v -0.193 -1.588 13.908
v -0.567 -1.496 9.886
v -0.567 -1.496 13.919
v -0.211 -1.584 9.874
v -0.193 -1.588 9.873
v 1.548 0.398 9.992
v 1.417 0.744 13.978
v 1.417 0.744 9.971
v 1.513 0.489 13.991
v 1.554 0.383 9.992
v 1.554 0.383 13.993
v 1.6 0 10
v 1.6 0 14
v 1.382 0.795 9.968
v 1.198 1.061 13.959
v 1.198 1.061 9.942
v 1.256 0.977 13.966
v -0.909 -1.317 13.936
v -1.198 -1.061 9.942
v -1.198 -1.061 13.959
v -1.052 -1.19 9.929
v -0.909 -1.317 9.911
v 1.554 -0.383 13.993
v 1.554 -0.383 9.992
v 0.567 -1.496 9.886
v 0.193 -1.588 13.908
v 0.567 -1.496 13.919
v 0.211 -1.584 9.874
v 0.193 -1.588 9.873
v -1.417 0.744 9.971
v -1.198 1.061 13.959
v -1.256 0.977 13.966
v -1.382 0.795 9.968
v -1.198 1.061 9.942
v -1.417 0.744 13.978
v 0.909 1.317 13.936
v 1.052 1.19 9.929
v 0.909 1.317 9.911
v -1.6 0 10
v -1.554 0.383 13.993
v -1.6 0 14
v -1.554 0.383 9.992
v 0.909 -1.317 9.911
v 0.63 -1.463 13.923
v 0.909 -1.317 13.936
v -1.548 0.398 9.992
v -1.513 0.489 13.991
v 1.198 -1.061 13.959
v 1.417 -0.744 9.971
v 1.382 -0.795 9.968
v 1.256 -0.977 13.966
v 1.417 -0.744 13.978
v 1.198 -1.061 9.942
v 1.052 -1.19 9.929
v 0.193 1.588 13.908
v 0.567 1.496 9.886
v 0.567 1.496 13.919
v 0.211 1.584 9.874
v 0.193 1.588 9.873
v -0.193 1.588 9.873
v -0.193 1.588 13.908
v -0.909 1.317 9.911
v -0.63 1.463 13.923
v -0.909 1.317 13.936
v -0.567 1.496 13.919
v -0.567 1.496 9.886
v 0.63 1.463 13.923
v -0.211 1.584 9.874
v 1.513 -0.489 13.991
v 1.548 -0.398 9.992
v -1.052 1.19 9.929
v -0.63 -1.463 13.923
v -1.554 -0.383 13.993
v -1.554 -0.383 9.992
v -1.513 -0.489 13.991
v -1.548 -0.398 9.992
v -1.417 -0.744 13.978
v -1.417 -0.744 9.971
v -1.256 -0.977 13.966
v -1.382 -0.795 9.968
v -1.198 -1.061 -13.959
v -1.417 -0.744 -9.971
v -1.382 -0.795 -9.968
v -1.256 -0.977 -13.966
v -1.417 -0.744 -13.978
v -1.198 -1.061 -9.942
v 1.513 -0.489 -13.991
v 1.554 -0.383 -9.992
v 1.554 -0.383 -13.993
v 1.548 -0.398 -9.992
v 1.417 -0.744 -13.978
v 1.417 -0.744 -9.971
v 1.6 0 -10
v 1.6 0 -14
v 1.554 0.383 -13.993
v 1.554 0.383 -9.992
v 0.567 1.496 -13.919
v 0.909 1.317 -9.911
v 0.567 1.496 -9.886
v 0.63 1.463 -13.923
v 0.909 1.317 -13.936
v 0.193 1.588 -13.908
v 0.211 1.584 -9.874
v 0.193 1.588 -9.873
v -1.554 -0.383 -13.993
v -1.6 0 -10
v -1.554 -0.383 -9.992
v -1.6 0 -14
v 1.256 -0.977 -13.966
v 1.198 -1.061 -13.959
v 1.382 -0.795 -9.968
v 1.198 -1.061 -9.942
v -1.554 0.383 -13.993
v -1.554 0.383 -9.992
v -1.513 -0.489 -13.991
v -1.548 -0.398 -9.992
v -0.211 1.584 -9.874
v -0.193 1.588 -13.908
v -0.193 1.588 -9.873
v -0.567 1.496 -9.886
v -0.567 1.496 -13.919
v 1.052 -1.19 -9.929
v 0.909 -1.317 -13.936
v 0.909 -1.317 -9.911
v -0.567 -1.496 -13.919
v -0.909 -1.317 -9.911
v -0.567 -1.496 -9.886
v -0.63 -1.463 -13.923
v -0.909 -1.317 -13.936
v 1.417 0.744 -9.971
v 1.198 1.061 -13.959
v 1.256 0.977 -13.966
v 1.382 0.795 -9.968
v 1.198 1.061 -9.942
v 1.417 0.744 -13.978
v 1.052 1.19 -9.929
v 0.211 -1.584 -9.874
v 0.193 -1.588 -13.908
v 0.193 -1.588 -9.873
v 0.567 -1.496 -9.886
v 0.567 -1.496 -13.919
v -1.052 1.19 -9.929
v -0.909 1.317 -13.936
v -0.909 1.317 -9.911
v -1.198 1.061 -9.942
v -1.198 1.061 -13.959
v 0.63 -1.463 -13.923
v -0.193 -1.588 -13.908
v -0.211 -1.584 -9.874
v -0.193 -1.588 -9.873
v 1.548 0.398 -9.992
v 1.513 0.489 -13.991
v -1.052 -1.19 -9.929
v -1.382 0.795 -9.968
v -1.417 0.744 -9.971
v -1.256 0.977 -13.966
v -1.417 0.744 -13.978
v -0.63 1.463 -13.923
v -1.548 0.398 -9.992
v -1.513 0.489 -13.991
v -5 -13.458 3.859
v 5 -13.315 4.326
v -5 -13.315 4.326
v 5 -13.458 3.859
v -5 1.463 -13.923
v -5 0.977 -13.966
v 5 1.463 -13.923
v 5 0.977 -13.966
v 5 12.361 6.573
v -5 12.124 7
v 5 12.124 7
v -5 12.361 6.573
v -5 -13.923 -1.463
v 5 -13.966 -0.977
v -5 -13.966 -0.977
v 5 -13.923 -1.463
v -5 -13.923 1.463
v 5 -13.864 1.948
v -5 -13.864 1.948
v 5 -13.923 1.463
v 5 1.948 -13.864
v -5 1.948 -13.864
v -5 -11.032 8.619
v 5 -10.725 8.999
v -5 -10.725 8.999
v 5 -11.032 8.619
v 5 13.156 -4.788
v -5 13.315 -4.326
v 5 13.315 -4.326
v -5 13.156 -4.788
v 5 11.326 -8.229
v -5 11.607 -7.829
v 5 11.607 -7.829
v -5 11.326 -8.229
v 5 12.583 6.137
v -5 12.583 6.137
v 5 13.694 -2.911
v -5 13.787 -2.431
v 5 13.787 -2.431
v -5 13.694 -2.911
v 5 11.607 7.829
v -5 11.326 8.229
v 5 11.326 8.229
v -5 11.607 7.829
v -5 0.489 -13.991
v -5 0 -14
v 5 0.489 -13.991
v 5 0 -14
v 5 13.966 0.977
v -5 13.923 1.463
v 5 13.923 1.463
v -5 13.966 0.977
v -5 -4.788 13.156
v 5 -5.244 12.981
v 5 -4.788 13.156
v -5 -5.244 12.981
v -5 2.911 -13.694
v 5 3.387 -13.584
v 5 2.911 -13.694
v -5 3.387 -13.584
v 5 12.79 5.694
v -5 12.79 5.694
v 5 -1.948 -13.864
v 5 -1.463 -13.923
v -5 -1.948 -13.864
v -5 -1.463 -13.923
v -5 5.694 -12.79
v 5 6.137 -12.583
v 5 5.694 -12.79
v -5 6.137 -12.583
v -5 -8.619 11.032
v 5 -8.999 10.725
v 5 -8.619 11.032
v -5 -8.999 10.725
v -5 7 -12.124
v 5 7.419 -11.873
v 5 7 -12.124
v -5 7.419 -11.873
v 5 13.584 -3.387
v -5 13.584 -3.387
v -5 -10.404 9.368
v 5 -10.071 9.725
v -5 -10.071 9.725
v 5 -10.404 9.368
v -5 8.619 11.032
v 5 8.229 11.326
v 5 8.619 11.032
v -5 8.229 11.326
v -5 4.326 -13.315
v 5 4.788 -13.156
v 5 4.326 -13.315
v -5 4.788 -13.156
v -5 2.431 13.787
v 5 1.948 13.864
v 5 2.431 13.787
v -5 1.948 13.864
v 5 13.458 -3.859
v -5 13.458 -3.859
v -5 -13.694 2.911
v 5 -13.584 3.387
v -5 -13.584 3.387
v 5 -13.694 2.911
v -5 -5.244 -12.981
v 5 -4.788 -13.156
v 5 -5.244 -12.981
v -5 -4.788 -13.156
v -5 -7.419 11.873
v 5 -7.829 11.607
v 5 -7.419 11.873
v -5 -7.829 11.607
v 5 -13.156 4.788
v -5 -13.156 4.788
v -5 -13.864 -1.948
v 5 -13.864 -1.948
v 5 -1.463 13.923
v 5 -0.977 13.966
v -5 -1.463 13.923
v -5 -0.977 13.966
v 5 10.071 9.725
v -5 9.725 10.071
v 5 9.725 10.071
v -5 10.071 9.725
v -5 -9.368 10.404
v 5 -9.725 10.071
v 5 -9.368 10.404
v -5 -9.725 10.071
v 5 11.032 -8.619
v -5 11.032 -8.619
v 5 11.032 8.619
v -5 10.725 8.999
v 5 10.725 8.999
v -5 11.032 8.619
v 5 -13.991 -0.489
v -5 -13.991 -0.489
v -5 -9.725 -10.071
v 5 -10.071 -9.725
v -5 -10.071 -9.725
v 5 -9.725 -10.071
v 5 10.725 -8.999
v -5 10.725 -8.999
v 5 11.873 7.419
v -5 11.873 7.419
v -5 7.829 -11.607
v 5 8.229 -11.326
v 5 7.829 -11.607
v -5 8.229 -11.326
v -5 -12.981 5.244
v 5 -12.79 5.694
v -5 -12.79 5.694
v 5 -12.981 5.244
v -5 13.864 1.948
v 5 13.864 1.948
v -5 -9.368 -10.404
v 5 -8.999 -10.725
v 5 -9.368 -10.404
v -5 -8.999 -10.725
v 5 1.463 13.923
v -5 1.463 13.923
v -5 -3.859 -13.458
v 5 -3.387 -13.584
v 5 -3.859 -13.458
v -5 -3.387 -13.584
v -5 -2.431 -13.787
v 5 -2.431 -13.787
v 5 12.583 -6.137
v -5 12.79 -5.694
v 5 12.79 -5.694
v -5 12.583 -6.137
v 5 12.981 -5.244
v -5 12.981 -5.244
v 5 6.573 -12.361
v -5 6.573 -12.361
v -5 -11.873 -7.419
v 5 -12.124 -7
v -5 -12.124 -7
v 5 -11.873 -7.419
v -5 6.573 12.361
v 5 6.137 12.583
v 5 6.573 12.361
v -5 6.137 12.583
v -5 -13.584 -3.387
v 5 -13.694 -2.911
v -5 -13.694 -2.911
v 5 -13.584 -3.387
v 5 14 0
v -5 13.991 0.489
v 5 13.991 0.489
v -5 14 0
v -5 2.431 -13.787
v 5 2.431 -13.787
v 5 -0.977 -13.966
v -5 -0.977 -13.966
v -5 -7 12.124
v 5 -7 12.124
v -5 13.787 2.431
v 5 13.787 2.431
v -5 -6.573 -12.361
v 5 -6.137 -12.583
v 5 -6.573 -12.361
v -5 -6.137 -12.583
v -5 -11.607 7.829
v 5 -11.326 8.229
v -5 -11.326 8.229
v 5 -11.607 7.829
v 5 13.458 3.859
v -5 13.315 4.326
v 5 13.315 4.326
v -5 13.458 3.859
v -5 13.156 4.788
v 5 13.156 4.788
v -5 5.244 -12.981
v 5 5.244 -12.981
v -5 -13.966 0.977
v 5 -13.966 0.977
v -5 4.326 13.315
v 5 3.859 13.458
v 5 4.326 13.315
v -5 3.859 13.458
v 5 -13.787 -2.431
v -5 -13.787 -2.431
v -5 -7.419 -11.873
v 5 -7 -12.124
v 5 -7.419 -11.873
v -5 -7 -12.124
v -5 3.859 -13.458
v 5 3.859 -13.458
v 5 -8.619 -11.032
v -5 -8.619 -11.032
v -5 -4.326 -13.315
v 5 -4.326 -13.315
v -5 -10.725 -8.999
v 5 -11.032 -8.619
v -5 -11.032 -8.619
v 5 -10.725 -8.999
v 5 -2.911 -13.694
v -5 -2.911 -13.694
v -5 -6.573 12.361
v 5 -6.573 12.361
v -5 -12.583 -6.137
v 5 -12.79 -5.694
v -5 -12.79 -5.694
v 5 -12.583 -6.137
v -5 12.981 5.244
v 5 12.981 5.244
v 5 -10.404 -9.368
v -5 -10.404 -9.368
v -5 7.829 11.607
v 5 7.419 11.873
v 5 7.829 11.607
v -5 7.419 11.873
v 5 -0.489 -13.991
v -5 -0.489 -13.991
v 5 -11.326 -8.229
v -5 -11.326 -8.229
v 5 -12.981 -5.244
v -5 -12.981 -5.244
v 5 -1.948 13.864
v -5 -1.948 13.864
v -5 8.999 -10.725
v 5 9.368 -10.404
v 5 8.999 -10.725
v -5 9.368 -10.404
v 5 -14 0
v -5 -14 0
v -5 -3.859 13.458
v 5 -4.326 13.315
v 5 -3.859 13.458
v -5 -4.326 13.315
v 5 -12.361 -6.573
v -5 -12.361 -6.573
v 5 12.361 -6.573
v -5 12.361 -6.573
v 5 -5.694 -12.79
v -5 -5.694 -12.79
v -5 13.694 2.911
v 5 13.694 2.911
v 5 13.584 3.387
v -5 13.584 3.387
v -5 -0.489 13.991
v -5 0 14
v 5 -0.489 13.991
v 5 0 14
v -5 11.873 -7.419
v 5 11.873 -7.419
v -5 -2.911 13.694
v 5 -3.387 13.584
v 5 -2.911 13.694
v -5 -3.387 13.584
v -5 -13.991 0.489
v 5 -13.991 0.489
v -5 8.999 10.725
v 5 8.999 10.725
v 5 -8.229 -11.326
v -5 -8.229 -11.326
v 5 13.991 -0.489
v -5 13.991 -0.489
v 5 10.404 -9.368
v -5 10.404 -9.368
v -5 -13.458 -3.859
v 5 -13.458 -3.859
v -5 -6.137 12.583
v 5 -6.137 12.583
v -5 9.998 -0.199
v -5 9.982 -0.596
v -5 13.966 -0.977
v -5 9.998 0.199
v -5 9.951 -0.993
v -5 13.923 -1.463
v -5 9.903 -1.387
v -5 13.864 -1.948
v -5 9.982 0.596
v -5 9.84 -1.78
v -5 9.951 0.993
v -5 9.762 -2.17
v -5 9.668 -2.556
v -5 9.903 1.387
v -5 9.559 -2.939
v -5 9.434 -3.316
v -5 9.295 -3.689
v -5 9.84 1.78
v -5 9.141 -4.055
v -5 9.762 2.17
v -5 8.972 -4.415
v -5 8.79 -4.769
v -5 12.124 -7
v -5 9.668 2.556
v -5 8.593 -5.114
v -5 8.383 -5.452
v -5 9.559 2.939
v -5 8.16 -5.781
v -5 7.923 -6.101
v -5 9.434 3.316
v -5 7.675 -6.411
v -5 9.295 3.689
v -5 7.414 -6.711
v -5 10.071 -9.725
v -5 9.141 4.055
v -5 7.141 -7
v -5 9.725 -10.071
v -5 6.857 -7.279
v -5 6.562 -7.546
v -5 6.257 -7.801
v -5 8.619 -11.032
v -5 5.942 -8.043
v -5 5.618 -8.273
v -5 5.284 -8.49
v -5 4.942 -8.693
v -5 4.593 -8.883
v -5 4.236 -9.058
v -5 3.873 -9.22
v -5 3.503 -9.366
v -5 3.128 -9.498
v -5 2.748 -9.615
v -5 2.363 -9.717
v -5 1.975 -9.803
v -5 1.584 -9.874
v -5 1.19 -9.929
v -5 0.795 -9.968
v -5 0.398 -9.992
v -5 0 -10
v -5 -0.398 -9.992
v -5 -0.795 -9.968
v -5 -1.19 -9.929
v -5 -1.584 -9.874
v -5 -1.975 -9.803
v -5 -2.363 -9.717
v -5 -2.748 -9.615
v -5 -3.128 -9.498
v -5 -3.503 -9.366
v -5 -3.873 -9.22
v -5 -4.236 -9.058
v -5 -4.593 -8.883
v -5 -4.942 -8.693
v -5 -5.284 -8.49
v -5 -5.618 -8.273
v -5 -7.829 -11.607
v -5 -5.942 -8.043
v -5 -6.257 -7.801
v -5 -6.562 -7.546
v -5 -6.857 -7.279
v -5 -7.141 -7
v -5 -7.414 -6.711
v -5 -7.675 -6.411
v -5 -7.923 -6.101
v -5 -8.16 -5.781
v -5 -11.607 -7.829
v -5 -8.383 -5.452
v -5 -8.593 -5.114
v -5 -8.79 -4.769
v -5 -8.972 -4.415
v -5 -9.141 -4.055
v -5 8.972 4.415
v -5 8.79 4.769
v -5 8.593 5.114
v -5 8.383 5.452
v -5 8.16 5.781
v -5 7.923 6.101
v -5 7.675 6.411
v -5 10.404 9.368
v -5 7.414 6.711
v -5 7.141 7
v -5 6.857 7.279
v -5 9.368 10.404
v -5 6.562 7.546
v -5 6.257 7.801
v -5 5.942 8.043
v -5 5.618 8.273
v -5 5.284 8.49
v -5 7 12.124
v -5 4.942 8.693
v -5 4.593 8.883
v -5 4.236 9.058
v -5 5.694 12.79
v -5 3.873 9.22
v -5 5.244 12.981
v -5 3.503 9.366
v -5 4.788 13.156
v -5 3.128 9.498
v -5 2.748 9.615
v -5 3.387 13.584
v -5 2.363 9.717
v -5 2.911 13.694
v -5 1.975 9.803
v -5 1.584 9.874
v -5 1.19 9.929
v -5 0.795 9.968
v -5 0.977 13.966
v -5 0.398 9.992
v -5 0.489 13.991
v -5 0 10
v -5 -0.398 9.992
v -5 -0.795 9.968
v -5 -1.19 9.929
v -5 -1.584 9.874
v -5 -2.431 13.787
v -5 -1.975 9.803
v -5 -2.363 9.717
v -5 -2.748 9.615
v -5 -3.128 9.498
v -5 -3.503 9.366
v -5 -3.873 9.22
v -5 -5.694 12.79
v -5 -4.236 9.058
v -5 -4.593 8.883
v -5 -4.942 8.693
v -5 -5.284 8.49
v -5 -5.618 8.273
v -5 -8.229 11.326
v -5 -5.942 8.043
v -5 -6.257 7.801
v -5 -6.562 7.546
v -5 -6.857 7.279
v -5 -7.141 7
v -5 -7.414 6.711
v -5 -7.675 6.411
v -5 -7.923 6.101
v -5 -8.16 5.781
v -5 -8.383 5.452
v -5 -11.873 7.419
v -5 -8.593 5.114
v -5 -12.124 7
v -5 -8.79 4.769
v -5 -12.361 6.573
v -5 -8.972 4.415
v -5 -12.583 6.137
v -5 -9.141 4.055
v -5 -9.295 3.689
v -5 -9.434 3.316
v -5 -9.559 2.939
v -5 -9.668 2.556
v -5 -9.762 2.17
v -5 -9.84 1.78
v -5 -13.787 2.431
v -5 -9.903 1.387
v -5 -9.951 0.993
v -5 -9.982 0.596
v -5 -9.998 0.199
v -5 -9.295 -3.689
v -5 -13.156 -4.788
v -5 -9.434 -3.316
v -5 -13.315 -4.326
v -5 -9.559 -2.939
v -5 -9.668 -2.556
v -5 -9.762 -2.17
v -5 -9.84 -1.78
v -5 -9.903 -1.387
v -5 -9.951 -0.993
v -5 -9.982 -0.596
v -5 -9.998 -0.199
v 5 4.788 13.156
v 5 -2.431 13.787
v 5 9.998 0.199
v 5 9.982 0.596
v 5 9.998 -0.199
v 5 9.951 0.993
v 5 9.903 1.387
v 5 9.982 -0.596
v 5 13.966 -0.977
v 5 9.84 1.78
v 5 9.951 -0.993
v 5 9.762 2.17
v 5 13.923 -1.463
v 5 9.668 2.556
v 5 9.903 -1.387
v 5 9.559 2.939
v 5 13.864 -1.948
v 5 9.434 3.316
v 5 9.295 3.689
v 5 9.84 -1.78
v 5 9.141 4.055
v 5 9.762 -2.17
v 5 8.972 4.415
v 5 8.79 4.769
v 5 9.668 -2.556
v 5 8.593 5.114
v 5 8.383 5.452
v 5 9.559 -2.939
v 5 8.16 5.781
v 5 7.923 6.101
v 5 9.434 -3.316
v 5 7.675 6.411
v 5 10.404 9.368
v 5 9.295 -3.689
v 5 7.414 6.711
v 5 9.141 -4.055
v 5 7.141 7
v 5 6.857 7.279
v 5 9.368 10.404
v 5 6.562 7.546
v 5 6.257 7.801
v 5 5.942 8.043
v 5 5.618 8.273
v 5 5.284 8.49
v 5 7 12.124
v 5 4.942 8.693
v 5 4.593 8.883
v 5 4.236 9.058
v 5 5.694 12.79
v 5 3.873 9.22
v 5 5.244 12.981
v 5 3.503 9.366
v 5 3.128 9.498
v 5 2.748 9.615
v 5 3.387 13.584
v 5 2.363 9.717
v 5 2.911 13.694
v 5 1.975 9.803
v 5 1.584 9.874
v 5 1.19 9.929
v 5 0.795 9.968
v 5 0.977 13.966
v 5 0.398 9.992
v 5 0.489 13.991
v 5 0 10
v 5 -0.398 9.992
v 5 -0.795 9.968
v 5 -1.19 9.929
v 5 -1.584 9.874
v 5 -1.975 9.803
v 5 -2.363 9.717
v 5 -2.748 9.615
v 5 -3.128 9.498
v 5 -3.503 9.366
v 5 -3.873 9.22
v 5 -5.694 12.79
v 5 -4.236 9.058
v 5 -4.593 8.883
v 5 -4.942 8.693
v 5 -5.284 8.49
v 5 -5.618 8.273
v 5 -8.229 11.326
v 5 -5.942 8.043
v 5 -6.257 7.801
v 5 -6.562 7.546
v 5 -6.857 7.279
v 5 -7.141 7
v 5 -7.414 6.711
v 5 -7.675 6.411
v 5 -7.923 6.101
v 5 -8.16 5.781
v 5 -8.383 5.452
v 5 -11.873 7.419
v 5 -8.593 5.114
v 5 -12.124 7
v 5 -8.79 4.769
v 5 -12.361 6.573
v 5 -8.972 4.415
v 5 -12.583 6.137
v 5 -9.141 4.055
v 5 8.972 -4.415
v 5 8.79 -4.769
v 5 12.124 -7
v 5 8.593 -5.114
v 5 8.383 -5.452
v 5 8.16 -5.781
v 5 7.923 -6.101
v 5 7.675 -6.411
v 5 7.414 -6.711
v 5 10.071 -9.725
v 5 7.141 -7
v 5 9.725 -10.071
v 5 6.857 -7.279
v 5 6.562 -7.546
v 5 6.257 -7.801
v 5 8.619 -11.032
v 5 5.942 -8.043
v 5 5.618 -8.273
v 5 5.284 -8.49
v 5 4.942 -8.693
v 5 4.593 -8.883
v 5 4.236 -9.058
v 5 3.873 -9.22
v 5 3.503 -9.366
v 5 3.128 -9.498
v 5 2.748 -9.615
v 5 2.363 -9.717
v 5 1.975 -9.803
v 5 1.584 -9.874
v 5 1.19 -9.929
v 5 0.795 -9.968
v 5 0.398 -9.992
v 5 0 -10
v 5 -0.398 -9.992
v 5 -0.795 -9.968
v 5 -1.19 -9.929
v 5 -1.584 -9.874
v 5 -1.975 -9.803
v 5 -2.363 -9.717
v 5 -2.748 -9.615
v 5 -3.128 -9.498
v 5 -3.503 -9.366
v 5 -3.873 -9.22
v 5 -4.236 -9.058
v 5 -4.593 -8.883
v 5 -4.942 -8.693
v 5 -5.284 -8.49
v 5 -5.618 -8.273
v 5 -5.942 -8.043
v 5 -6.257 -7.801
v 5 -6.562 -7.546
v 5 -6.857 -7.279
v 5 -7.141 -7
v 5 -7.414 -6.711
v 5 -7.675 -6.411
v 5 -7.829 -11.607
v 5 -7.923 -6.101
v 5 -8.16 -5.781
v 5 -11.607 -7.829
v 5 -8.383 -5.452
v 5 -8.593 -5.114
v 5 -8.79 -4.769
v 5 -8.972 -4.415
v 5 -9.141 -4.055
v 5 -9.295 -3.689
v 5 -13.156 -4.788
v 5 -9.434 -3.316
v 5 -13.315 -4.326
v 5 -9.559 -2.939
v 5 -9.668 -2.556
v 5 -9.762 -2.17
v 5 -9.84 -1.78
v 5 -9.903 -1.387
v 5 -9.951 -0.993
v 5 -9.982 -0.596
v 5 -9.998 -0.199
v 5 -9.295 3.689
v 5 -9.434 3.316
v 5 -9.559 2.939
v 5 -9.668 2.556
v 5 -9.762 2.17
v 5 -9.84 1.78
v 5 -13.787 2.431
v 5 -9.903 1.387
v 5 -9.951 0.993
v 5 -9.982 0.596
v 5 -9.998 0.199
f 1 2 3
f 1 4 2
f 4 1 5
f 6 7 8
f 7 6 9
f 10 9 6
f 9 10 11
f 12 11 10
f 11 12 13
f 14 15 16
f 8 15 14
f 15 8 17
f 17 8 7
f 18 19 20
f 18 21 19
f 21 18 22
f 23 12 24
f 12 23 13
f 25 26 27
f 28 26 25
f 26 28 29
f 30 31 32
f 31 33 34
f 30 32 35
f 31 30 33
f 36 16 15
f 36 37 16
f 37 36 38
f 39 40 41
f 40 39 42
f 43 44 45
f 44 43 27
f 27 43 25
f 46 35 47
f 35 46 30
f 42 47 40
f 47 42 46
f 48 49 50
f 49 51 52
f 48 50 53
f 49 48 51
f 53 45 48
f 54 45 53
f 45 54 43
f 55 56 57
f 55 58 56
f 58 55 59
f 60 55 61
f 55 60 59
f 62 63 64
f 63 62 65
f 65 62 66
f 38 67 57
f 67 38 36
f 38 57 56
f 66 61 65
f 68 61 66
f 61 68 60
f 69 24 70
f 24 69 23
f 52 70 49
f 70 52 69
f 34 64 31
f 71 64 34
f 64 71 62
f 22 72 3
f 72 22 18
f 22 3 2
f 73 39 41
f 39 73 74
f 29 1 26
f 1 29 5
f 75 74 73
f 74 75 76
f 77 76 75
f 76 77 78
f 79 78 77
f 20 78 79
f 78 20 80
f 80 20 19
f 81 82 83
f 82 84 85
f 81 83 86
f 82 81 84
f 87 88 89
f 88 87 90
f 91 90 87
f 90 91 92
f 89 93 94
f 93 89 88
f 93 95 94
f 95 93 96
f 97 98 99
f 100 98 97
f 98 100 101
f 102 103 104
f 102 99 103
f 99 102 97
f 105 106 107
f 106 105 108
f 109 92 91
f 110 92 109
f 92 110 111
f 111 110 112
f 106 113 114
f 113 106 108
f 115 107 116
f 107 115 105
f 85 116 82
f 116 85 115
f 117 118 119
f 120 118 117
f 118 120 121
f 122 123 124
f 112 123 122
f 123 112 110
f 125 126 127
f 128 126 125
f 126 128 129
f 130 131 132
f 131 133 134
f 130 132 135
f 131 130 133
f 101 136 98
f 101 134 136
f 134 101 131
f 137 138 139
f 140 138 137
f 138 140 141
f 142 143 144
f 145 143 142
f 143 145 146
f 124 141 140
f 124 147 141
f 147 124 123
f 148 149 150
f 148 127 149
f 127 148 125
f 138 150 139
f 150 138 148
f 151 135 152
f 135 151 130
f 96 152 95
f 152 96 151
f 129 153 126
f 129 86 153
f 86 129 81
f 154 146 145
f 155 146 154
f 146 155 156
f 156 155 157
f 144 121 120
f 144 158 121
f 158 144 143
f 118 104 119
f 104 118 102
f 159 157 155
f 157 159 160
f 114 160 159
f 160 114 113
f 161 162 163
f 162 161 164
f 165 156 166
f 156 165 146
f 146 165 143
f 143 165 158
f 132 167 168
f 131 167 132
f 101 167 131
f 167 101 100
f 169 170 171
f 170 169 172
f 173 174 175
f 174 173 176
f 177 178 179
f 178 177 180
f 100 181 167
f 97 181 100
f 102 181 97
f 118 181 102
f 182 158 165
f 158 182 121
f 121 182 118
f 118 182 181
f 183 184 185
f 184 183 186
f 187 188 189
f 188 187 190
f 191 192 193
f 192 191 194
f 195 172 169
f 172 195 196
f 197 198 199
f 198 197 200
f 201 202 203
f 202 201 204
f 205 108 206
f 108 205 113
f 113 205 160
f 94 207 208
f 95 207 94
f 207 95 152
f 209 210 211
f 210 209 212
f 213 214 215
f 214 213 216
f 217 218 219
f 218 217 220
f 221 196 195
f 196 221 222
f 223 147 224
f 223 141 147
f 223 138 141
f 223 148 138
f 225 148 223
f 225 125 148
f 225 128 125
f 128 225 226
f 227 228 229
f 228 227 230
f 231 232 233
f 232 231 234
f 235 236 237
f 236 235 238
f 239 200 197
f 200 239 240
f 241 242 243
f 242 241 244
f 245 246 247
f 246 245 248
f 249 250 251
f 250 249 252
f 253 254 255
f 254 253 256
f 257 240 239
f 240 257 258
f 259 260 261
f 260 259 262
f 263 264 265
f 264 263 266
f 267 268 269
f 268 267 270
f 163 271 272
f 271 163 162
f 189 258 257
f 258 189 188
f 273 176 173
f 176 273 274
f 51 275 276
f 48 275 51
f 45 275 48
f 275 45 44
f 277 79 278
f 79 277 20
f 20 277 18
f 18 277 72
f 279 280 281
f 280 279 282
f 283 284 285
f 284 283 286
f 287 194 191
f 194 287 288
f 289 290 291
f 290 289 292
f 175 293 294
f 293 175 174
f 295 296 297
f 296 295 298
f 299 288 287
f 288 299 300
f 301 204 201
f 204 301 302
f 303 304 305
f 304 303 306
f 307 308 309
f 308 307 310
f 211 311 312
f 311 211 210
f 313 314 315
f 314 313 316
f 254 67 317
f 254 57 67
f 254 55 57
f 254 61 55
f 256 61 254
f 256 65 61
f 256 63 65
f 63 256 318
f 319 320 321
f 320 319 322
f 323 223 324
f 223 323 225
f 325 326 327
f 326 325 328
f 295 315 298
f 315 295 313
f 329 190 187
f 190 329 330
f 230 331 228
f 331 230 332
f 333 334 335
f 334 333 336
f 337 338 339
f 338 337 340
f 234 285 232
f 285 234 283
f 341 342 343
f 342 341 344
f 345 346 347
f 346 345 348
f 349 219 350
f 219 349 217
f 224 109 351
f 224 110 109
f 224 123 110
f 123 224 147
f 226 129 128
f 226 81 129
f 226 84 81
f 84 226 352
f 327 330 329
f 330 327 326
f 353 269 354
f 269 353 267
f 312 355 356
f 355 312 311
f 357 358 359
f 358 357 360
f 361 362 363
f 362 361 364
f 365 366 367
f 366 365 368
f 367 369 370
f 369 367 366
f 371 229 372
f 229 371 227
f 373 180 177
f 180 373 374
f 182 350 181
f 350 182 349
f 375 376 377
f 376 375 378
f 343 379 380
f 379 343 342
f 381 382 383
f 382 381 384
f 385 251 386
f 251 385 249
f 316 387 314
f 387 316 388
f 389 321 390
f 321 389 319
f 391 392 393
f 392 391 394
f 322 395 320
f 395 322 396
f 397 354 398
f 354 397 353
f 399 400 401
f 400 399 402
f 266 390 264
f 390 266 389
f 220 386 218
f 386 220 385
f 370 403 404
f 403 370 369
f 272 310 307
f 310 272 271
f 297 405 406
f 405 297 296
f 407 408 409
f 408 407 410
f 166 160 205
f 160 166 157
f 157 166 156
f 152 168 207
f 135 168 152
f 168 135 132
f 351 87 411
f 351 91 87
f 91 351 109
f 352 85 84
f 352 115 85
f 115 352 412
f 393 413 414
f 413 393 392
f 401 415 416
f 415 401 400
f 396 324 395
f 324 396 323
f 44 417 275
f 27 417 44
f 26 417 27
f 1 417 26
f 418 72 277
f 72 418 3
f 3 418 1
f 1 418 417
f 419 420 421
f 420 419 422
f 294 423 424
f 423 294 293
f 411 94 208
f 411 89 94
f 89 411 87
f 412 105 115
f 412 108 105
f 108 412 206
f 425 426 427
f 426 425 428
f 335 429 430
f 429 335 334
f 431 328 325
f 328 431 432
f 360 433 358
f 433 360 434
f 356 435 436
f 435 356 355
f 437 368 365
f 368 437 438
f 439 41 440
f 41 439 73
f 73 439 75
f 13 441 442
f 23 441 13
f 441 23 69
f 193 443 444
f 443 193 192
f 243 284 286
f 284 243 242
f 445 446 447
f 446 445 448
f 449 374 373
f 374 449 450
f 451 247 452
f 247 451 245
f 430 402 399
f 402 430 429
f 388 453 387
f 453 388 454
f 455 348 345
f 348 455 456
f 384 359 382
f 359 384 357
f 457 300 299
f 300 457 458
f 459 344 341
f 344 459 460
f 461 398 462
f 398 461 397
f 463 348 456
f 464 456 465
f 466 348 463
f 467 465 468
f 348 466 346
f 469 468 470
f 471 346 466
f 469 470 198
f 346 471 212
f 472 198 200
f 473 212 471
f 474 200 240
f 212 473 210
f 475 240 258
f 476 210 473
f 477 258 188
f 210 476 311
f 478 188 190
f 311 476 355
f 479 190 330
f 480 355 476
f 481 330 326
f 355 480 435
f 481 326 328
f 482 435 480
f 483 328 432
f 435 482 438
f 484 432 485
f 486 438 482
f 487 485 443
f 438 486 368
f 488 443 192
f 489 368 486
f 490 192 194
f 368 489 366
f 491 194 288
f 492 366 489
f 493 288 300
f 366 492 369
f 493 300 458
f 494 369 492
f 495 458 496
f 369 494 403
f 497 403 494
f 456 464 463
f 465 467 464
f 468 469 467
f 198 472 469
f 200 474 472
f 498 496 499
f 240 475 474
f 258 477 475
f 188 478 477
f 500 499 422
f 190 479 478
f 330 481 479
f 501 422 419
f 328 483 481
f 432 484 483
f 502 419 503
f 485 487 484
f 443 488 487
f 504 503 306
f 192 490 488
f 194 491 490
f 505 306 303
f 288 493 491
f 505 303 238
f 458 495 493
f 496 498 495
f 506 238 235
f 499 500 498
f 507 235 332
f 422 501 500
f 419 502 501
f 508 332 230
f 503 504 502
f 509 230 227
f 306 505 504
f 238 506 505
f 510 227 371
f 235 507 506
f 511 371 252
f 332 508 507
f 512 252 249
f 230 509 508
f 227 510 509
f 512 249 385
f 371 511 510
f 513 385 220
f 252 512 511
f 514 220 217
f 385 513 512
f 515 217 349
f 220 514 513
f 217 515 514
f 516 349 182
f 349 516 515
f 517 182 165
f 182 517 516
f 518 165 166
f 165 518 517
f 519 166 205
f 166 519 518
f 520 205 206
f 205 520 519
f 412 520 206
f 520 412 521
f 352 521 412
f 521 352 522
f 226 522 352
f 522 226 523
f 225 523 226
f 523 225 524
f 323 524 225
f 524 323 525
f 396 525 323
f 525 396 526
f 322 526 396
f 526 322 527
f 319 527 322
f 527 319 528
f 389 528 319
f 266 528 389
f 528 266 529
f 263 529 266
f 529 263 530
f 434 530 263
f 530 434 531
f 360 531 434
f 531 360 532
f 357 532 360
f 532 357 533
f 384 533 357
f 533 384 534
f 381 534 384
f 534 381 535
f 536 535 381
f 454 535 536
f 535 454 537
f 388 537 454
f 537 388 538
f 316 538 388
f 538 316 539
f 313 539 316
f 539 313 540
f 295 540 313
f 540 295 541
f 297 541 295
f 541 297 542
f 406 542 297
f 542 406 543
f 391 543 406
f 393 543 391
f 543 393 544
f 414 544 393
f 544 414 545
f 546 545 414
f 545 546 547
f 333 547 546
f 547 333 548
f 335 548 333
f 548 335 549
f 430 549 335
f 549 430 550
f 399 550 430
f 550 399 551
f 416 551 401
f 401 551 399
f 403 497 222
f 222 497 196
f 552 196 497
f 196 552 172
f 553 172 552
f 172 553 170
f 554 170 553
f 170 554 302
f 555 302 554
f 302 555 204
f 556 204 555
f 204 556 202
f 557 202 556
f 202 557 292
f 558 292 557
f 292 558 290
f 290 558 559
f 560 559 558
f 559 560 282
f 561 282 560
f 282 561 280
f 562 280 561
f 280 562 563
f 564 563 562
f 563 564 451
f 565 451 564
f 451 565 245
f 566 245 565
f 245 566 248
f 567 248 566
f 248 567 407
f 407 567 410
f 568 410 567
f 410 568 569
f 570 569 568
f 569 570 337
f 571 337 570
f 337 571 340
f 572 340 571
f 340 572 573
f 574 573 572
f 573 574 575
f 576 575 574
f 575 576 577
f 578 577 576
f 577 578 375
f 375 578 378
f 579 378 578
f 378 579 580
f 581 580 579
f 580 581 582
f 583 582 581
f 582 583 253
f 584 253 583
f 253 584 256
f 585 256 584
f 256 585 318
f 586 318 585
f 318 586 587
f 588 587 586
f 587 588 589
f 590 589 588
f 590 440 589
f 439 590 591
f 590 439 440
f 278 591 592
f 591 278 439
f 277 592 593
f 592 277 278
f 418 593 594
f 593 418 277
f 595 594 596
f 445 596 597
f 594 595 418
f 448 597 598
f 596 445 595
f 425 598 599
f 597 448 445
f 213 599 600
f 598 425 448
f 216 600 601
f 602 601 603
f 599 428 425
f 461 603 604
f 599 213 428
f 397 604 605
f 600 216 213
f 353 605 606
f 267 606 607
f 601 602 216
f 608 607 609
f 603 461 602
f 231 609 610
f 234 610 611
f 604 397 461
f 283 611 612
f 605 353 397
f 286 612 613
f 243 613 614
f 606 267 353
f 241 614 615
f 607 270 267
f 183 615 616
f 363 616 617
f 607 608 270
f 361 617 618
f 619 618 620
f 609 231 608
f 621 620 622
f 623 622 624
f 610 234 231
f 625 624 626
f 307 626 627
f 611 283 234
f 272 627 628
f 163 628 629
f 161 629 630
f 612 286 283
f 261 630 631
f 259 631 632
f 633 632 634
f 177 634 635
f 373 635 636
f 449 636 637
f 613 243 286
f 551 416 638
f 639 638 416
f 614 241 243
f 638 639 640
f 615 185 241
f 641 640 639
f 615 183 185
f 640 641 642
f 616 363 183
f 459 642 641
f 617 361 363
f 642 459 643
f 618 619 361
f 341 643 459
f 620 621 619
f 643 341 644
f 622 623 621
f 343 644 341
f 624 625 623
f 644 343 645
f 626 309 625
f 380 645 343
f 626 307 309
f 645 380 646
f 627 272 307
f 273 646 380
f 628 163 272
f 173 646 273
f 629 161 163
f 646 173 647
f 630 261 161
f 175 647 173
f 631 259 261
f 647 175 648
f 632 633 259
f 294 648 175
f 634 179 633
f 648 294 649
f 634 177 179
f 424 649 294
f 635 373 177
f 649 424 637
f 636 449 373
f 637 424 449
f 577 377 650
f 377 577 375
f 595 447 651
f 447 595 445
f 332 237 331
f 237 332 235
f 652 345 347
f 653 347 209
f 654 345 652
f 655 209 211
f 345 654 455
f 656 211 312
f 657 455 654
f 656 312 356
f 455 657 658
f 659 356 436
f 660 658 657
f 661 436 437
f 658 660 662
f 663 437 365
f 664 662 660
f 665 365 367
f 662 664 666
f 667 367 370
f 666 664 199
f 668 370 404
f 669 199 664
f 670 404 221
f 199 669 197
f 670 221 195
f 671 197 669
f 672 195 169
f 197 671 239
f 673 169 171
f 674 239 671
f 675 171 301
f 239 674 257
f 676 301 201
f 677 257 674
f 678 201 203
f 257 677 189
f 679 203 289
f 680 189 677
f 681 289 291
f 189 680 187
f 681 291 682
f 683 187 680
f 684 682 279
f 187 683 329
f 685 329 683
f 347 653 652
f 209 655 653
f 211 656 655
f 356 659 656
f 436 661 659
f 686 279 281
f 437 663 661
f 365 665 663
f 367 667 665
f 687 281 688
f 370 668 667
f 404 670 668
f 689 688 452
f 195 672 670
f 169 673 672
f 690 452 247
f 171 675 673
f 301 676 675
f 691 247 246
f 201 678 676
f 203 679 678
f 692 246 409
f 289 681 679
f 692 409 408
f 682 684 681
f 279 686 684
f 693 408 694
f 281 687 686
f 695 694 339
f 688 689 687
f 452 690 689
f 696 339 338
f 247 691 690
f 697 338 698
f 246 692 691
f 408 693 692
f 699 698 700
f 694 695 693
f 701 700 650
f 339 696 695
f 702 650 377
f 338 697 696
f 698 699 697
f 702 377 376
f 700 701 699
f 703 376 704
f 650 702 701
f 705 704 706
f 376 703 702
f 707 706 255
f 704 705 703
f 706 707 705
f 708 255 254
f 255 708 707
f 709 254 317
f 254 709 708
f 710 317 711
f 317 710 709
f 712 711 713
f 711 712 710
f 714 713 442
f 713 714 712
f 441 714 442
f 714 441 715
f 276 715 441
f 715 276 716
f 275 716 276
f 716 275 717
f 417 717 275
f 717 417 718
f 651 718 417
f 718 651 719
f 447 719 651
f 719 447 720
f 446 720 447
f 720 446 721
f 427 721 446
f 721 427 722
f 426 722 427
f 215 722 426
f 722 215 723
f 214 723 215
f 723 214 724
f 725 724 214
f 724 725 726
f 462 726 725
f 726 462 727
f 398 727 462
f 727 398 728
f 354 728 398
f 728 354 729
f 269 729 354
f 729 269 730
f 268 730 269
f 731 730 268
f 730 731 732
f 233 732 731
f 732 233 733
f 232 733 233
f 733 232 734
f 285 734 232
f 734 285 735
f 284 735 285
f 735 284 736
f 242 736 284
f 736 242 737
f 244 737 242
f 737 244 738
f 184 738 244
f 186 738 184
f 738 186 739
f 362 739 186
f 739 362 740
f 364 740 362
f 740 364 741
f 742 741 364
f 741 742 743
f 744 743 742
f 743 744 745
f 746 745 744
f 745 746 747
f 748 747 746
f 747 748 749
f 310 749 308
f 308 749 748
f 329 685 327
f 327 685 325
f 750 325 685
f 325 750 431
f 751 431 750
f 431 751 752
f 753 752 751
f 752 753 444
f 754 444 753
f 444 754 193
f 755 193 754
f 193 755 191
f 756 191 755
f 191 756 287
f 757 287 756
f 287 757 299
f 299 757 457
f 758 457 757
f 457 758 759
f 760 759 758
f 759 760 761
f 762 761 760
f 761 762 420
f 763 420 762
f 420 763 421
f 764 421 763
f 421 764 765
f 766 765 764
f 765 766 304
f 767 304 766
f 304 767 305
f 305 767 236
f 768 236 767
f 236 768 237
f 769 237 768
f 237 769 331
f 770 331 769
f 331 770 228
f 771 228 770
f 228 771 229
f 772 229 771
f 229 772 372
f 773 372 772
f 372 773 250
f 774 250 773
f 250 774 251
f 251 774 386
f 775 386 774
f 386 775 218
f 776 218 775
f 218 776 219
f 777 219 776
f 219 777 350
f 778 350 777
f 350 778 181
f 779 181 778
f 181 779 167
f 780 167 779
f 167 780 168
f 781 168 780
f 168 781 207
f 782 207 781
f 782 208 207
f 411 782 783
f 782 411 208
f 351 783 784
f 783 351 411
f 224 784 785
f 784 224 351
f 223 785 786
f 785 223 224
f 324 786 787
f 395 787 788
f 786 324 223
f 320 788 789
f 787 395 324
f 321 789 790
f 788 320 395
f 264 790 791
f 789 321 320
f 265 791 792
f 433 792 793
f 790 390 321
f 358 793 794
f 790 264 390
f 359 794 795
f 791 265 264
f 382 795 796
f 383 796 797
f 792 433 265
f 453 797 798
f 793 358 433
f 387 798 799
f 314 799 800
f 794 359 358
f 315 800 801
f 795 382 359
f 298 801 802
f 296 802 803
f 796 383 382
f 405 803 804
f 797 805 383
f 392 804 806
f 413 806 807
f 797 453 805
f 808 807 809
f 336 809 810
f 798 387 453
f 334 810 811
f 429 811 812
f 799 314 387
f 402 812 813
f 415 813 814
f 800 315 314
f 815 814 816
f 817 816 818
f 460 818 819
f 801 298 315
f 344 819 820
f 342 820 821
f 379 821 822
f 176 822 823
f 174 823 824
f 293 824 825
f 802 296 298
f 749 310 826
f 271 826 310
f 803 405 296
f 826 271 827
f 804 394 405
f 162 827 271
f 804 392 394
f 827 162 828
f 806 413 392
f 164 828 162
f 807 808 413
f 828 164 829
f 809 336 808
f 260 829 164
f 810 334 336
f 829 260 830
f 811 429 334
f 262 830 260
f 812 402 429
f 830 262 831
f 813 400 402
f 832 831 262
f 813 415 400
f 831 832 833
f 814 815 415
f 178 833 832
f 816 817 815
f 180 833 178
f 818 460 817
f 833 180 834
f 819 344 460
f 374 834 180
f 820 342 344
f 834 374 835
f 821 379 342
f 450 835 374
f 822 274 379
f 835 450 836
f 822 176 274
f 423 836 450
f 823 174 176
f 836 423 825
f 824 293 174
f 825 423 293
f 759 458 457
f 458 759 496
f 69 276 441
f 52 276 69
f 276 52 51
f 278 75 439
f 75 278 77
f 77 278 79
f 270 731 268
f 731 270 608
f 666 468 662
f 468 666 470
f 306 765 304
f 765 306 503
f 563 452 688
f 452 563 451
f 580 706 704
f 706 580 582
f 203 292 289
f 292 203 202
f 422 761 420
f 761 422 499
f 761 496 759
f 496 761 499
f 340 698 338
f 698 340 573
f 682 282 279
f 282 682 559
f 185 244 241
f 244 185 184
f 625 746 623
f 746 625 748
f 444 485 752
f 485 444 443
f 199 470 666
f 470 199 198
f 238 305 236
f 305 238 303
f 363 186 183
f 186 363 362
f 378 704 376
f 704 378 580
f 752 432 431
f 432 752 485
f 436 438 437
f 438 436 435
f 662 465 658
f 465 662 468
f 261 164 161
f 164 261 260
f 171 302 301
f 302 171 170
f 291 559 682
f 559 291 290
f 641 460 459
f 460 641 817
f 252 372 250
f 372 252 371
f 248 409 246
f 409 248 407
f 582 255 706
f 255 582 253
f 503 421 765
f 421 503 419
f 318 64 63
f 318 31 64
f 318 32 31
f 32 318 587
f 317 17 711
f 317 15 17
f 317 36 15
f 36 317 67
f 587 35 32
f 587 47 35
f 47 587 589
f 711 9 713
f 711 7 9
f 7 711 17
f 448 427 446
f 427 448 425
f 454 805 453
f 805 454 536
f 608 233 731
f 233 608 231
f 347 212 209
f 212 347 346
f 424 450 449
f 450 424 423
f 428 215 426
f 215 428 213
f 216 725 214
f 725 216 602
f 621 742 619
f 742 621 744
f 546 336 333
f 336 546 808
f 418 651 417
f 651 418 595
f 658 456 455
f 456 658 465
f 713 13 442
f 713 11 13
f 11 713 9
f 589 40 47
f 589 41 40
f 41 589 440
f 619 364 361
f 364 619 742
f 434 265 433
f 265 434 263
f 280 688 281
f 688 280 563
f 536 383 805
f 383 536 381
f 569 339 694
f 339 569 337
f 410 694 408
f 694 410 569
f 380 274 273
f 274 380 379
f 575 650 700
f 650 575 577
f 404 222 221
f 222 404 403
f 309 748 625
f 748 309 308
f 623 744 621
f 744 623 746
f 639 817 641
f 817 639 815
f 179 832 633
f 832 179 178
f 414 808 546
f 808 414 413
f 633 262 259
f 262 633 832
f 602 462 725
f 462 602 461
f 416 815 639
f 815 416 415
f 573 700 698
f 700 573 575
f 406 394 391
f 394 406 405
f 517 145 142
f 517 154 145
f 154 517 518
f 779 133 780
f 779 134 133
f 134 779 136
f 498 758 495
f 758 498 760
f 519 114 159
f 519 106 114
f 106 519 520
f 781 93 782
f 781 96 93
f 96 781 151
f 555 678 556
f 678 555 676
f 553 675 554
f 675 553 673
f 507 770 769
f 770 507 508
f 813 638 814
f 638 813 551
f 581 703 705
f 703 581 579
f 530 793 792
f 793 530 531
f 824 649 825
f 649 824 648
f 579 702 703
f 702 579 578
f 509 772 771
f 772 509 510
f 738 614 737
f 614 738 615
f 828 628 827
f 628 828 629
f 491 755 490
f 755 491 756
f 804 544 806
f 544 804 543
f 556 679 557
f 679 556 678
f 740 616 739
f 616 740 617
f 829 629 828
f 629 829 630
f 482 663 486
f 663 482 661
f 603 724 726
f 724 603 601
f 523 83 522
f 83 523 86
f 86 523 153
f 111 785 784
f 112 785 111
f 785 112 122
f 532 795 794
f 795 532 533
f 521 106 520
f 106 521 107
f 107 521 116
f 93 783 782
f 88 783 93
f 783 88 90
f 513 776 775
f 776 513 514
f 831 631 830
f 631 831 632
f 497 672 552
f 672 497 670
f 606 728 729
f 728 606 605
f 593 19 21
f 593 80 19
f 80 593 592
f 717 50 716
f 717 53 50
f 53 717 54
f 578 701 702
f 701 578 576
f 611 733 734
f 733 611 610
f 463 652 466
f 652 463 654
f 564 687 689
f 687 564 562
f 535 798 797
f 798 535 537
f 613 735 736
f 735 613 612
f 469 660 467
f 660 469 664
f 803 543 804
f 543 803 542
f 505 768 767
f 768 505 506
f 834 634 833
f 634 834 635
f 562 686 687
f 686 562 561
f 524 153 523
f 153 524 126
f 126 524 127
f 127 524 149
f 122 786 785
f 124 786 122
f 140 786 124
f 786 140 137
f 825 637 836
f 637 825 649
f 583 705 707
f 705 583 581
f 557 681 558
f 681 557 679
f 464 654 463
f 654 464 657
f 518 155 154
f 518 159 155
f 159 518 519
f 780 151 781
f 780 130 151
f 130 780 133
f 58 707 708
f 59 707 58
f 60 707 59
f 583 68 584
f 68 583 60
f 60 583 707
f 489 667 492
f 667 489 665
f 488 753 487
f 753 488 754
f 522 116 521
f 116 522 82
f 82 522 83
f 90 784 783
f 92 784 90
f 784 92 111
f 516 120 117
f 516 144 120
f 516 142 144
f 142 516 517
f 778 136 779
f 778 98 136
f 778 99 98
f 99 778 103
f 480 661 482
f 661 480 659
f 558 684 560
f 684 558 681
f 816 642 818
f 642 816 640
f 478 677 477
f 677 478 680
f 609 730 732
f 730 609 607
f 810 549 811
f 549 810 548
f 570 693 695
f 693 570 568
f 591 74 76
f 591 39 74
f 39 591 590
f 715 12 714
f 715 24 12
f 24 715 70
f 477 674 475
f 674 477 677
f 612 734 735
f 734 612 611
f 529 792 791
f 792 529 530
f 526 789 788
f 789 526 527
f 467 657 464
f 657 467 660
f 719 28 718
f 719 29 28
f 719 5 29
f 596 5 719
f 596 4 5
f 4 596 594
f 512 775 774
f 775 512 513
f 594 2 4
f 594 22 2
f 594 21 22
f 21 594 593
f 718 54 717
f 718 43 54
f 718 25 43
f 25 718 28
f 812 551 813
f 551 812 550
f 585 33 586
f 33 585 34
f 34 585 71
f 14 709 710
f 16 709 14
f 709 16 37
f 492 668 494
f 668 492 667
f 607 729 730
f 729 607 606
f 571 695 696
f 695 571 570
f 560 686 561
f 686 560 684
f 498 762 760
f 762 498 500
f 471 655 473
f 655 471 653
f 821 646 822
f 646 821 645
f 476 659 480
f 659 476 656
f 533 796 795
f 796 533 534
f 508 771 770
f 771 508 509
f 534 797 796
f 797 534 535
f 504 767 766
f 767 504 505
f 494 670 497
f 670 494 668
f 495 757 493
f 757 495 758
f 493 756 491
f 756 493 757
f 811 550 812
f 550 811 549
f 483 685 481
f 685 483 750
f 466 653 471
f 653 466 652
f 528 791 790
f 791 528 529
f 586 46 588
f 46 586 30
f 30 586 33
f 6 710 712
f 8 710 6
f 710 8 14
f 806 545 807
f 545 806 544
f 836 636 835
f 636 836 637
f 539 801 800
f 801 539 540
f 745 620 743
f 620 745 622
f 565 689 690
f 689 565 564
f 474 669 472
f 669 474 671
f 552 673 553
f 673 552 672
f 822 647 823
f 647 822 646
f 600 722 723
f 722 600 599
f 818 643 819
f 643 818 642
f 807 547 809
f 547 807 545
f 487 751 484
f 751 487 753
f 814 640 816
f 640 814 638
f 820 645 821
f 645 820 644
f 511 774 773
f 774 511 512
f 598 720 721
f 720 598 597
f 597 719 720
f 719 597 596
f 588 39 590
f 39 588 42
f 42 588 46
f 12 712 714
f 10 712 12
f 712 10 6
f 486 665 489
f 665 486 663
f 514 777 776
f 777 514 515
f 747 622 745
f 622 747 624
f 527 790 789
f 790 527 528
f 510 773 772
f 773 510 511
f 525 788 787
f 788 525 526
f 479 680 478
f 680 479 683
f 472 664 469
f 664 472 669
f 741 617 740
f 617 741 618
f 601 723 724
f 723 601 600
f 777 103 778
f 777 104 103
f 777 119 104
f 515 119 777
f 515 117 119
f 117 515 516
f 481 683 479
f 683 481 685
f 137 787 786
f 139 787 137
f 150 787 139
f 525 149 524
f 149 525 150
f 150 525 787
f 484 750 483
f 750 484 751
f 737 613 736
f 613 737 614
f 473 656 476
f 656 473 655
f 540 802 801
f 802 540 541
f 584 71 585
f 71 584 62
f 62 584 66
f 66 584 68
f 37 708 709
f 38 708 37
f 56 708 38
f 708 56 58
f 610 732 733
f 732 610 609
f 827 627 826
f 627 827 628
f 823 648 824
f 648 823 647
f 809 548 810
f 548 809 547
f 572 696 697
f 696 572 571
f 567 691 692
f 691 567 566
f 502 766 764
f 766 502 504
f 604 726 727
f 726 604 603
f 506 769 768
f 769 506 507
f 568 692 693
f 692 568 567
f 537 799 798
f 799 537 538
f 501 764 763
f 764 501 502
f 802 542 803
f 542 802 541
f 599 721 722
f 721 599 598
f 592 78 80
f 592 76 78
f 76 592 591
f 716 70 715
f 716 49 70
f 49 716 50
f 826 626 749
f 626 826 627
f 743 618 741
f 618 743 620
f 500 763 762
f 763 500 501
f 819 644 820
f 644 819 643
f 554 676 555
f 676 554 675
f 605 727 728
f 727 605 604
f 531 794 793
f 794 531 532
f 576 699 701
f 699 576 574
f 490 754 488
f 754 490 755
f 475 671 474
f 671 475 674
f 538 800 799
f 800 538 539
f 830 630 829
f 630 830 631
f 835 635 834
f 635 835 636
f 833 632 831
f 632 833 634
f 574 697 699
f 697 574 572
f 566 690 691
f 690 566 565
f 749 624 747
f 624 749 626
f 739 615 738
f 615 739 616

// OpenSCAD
$fa = 2;
$fs = 0.4;

module gimbal_roll_ring() {
  color("#3a3a42")
    difference() {
      rotate([0, 90, 0])
        cylinder(h = 10, d = 28, center = true);
      rotate([0, 90, 0])
        cylinder(h = 12, d = 20, center = true);
      for (a = [0, 180])
        rotate([a, 0, 0])
          translate([0, 0, 10])
            cylinder(h = 8, d = 3.2, center = true);
    }
}

gimbal_roll_ring();
